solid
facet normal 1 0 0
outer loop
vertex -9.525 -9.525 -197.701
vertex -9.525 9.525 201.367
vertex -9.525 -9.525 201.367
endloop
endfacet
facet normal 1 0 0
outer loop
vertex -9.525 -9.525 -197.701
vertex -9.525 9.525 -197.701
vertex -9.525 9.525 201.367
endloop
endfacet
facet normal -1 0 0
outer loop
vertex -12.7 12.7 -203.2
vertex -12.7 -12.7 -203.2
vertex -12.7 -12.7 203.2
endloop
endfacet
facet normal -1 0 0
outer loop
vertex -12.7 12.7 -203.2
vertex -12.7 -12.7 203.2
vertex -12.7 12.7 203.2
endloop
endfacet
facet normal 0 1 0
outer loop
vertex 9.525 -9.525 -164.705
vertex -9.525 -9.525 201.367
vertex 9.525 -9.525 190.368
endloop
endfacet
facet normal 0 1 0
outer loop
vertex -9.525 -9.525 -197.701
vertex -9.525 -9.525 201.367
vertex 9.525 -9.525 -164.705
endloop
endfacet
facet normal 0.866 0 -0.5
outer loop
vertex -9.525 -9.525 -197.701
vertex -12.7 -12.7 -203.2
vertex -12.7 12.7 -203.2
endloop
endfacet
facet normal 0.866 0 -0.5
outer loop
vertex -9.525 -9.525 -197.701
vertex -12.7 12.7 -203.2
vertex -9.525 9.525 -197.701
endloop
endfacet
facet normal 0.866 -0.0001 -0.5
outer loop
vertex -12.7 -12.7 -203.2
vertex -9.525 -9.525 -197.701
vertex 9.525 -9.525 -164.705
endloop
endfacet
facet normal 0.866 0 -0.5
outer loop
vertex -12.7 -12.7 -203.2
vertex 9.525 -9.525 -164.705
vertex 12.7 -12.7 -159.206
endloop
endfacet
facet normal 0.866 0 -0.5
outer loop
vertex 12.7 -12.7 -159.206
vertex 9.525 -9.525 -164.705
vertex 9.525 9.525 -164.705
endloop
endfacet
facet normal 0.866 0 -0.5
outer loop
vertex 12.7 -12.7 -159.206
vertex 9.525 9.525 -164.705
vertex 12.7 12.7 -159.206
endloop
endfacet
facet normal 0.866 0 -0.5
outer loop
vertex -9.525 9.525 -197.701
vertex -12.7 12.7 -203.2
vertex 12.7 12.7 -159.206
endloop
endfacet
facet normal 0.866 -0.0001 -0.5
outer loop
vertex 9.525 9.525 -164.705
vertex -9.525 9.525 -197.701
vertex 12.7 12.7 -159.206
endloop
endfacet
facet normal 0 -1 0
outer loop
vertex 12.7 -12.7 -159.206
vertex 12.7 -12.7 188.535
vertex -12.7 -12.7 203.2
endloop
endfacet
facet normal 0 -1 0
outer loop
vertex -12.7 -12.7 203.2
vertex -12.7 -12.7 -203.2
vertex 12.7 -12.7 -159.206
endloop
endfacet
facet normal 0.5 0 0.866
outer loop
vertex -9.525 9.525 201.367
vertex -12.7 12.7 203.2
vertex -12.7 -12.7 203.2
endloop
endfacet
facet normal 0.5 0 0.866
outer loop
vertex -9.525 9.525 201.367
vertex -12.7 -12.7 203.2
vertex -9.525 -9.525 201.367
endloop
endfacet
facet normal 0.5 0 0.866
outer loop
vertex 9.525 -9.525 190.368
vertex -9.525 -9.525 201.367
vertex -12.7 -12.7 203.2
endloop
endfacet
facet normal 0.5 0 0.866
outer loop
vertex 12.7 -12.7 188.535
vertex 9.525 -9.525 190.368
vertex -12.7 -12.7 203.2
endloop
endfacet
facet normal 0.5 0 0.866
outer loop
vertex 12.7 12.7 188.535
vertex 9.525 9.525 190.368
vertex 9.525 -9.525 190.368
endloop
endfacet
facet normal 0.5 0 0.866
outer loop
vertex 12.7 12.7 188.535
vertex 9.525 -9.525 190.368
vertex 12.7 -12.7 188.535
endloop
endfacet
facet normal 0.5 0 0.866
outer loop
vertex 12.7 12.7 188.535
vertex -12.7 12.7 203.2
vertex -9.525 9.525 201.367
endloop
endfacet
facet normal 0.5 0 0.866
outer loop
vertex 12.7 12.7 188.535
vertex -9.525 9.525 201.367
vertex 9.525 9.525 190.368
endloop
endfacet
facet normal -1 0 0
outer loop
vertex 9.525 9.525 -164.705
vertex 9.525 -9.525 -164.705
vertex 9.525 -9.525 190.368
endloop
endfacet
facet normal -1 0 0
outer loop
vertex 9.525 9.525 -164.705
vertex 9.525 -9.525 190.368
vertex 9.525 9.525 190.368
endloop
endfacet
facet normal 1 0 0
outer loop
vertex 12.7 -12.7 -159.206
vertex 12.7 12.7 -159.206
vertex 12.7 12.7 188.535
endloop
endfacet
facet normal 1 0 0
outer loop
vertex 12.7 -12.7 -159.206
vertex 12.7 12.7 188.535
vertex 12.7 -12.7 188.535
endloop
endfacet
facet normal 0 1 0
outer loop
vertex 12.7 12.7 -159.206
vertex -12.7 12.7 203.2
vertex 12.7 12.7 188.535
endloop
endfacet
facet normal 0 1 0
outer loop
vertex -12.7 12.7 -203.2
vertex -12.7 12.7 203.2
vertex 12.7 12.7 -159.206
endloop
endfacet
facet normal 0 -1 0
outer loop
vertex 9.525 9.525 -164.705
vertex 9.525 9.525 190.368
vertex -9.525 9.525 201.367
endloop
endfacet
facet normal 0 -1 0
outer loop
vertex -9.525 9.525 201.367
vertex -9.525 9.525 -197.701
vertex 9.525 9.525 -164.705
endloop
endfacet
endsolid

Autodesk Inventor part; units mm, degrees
ref_plane "YZ Plane" through (0, 0, 0) normal (1, 0, 0) x (0, 1, 0)
ref_plane "XZ Plane" through (0, 0, 0) normal (0, 1, 0) x (-1, 0, 0)
ref_plane "XY Plane" through (0, 0, 0) normal (0, 0, 1) x (1, 0, 0)
sketch "Sketch1" plane through (0, 0, 0) normal (0, 0, 1) x (1, 0, 0)
  line L0 (-17.78, 0) -> (17.78, 0) projected
  line L1 (0, -17.78) -> (0, 17.78) projected
  line L2 (-12.7, 12.7) -> (12.7, 12.7)
  line L3 (12.7, 12.7) -> (12.7, -12.7)
  line L4 (12.7, -12.7) -> (-12.7, -12.7)
  line L5 (-12.7, -12.7) -> (-12.7, 12.7)
  line L6 (9.525, 9.525) -> (-9.525, 9.525)
  line L7 (-9.525, 9.525) -> (-9.525, -9.525)
  line L8 (-9.525, -9.525) -> (9.525, -9.525)
  line L9 (9.525, -9.525) -> (9.525, 9.525)
  point P0 (0, 0)
  point P1 (-12.7, 0)
  point P2 (0, 12.7)
  dimension "d0" = 25.4
  dimension "d1" = 3.175
extrude "Extrusion1" add sketch "Sketch1" along normal mid plane 406.4 contours L5 L2 L1 L6 L7 L0 | L0 L7 L8 L1 L4 L5 | L1 L8 L9 L0 L3 L4 | L2 L3 L0 L9 L6 L1
sketch "Sketch3" plane through (-12.7, 12.7, 203.2) normal (0, 1, 0) x (1, 0, 0)
  line L0 (0, 0) -> (25.4, 0) projected
  line L1 (25.4, 0) -> (25.4, 406.4) projected
  line L2 (25.4, 406.4) -> (0, 406.4) projected
  line L3 (0, 406.4) -> (0, 0) projected
  line L4 (0, 203.2) -> (25.4, 203.2) construction
  line L5 (0, 0) -> (25.4, 14.6647)
  line L6 (0, 406.4) -> (25.4, 391.7353)
  line L7 (0, 406.4) -> (25.4, 406.4)
  line L8 (25.4, 391.7353) -> (25.4, 406.4)
  point P0 (12.7, 203.2)
  dimension "d7" = 30
extrude "Extrusion3" cut sketch "Sketch3" against normal through all contours L5 L1 L0
sketch "Sketch4" plane through (-12.7, 12.7, -203.2) normal (0, 1, 0) x (1, 0, 0)
  line L0 (25.4, -391.7353) -> (25.4, 0) projected
  line L1 (25.4, 0) -> (0, 0) projected
  line L2 (0, 0) -> (25.4, -43.9941)
  point P0 (12.7, -203.2)
  dimension "d10" = 60
extrude "Extrusion4" cut sketch "Sketch4" against normal through all
properties part number "tubing_template_0.125" material "Aluminum-6061"
